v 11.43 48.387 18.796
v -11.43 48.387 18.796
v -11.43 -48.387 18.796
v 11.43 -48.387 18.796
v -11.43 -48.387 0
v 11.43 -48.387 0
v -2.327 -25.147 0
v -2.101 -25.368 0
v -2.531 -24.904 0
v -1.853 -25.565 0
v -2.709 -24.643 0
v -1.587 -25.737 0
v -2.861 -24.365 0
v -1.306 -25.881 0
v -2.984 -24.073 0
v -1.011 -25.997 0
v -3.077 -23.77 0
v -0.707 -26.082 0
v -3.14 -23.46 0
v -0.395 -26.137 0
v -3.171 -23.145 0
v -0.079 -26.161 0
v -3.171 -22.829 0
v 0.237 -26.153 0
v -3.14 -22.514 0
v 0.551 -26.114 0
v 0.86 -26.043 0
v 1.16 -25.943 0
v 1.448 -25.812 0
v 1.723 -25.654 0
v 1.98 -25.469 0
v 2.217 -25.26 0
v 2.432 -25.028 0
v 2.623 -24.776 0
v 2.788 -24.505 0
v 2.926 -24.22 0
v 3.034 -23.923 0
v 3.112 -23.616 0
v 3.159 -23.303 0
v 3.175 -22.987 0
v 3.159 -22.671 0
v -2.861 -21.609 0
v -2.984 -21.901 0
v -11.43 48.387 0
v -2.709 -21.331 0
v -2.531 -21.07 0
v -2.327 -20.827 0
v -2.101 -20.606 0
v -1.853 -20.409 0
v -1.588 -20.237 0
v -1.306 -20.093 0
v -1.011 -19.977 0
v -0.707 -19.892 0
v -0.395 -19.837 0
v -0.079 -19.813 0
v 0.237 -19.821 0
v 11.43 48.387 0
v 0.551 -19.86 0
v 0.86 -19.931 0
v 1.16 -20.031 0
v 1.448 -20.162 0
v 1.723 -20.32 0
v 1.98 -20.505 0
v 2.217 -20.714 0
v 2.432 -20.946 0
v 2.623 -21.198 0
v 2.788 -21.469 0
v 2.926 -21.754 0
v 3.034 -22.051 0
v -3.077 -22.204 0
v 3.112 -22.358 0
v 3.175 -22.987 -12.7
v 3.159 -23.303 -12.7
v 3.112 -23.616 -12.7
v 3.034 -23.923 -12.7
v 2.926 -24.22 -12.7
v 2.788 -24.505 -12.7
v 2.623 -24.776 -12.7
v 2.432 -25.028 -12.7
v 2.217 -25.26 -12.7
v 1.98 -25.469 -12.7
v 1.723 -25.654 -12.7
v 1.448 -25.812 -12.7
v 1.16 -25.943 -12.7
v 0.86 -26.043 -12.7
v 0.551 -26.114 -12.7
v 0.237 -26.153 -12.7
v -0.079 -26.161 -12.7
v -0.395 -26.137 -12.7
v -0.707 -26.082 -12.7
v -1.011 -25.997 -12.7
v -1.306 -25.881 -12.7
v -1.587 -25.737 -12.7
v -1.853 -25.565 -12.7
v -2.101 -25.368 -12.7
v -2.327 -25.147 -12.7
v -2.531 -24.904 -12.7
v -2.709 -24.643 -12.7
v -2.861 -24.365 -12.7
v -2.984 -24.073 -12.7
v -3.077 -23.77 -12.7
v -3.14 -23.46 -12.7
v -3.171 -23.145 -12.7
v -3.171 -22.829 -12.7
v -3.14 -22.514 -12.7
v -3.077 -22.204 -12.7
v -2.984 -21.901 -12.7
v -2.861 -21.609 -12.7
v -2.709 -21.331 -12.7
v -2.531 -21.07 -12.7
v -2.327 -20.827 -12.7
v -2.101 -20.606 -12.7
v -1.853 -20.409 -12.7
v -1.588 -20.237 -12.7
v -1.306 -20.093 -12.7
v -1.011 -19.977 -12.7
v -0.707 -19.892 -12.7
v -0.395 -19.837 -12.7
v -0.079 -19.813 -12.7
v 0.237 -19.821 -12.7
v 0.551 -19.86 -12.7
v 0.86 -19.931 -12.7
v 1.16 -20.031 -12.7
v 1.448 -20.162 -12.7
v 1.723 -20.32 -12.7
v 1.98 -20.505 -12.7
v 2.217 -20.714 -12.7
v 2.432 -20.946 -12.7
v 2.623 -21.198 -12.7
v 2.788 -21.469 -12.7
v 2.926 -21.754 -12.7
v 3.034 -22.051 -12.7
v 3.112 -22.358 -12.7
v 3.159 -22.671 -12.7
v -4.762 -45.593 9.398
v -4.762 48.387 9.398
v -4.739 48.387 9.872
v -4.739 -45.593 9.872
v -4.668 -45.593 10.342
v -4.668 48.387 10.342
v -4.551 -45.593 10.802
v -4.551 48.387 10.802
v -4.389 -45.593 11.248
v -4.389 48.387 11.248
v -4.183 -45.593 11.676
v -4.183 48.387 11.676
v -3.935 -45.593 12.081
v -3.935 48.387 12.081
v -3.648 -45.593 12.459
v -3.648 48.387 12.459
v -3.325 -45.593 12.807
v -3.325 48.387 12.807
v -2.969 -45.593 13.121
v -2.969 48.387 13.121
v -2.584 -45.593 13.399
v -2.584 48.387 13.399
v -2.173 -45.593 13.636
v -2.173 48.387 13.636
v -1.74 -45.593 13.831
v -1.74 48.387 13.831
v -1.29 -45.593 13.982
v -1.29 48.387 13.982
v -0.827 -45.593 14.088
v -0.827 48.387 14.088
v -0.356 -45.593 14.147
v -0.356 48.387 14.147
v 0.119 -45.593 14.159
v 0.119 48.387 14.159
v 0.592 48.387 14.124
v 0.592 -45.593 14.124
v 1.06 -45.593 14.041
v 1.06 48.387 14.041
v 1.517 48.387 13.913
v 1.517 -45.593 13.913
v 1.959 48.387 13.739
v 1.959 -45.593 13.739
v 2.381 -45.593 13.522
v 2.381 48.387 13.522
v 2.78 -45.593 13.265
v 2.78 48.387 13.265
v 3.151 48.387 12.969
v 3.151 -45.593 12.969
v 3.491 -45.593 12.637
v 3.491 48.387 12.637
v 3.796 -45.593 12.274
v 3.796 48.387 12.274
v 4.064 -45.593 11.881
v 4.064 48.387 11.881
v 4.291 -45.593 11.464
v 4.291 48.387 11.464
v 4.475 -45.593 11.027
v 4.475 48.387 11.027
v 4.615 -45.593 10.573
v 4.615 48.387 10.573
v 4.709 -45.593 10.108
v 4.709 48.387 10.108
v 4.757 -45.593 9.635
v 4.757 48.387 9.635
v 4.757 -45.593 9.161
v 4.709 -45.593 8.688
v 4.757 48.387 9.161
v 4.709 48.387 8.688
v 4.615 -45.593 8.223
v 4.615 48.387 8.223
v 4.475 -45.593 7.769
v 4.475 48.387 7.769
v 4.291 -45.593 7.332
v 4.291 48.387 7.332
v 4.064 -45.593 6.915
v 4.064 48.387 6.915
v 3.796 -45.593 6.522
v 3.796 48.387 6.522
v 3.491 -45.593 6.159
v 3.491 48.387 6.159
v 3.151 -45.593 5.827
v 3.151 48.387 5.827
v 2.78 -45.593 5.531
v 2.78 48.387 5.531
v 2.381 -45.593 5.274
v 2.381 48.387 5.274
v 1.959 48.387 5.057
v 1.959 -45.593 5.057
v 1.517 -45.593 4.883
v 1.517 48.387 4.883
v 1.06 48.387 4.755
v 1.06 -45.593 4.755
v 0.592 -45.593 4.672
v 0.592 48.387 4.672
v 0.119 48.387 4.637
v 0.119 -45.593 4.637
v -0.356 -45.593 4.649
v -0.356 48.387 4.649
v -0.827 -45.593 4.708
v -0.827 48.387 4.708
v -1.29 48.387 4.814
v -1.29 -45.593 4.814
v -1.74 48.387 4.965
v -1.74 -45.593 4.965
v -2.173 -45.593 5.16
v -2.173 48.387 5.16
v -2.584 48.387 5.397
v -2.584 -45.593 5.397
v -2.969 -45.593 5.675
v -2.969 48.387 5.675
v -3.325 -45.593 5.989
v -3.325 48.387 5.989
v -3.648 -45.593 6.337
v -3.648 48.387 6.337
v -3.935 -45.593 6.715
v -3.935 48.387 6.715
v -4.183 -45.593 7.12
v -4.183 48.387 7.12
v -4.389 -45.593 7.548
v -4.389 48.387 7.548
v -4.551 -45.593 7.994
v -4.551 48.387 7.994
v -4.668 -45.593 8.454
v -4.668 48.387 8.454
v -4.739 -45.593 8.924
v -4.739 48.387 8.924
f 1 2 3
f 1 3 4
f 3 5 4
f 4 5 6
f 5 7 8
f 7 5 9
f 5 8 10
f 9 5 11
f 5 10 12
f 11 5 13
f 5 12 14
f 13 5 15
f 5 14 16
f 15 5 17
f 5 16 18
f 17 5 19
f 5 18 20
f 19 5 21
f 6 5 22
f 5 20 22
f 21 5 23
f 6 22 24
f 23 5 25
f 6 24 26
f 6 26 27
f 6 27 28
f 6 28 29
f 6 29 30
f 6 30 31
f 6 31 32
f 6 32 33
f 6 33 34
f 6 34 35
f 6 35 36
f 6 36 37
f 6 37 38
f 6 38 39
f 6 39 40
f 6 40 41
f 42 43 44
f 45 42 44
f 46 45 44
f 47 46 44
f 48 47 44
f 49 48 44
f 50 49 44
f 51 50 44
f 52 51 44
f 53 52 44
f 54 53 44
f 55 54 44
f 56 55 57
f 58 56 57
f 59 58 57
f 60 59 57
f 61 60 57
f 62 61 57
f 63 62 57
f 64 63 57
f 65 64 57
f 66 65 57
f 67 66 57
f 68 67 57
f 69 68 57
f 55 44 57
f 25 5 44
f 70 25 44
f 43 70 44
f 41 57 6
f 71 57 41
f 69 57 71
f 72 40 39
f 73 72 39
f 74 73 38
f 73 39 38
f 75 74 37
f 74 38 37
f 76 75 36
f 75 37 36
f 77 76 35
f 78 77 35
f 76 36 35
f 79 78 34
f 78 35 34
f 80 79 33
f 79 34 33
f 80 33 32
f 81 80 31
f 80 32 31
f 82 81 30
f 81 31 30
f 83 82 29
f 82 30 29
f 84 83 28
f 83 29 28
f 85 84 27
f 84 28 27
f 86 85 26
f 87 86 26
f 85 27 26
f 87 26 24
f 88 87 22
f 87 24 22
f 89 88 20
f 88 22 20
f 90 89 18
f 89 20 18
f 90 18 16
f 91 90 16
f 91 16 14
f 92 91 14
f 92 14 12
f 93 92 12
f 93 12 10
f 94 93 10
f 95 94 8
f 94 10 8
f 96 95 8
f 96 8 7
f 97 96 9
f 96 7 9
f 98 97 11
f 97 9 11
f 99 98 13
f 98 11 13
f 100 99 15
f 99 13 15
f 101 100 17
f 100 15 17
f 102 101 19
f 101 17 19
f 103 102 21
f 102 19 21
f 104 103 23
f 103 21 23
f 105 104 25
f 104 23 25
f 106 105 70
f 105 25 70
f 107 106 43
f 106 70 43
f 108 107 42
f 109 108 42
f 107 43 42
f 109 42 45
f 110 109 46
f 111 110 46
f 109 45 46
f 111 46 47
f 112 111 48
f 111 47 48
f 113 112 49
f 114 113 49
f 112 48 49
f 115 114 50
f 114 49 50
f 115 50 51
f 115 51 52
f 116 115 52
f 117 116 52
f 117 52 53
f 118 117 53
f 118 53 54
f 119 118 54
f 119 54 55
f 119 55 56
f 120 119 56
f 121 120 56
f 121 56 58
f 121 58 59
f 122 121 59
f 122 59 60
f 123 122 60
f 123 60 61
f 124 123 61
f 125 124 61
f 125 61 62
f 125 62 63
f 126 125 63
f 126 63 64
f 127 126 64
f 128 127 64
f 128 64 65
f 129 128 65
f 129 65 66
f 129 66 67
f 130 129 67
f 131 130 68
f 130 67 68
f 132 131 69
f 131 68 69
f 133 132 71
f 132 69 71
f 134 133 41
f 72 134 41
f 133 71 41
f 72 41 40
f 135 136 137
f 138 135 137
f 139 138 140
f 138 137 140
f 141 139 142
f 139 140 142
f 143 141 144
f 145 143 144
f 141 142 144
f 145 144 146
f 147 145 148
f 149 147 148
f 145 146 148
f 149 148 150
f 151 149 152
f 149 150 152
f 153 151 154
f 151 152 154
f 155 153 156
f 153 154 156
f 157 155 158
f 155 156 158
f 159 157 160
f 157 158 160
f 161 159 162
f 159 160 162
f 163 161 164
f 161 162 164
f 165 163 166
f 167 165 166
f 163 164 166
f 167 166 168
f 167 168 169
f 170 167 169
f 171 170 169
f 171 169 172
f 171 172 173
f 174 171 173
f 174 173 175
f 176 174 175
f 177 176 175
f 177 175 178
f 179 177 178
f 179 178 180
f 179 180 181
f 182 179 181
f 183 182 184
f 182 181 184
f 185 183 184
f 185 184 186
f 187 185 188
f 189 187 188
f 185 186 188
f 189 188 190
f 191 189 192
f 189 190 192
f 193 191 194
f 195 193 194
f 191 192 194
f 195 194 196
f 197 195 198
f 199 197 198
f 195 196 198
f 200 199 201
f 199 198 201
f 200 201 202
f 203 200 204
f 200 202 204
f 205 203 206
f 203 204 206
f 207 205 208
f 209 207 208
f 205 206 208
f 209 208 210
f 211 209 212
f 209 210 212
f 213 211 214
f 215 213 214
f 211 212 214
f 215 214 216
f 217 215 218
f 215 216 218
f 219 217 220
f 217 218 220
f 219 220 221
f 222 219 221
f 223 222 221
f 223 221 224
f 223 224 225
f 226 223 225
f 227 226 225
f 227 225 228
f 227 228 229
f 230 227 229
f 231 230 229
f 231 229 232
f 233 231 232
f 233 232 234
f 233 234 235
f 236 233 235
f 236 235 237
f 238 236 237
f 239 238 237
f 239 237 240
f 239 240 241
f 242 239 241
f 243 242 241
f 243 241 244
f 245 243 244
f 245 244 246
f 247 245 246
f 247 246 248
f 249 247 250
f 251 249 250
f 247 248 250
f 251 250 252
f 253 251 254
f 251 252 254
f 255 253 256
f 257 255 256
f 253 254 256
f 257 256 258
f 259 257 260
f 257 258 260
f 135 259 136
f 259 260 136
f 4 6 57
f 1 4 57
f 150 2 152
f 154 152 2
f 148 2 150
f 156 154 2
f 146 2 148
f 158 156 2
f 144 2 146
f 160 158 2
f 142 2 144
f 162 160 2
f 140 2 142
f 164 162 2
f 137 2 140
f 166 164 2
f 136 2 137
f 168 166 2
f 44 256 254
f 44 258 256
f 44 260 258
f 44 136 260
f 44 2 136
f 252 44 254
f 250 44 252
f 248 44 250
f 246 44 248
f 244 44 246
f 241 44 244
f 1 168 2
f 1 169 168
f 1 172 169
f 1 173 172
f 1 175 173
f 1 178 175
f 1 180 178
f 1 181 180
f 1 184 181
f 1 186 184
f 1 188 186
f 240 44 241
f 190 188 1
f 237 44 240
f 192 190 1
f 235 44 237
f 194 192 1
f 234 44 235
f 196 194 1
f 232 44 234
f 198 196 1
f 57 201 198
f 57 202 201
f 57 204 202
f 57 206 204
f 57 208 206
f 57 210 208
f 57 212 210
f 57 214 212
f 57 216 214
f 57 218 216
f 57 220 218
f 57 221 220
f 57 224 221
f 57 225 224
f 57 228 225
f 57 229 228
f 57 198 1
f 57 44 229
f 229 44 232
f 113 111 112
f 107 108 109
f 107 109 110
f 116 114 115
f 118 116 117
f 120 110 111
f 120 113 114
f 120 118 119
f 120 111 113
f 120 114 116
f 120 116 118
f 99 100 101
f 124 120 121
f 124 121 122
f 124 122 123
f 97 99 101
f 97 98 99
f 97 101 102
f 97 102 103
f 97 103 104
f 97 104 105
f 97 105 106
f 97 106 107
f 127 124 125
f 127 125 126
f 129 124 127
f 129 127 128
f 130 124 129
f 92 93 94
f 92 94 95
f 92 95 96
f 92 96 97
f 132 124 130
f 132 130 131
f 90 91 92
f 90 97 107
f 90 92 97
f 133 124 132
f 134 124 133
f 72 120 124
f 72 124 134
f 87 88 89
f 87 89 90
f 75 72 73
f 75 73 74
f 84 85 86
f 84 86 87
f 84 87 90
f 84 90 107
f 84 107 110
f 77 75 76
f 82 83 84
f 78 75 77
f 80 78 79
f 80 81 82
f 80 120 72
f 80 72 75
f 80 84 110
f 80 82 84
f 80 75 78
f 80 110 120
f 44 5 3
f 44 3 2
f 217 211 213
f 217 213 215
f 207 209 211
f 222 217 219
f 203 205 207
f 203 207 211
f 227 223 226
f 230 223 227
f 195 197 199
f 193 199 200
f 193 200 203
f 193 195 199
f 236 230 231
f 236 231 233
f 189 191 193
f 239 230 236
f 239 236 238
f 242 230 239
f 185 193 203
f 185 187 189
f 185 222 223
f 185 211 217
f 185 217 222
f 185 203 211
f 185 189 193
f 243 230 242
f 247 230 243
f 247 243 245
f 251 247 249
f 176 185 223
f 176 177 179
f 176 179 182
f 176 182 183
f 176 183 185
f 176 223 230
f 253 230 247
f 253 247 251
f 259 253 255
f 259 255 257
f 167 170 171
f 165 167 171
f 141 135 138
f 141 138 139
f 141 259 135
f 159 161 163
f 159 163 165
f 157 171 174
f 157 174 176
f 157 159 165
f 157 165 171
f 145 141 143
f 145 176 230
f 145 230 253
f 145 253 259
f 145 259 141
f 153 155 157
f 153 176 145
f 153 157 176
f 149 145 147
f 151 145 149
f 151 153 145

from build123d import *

# Parameters (mm, degrees)
F0_W     = 22.86
F0_H     = 96.774
F1_DEPTH = 18.796
F2_R     = 4.7625
F3_DEPTH = 93.98
F4_R     = 3.175
F5_DEPTH = 12.7


with BuildPart() as f1:
    # F0 (on Top) → F1 (new body)
    with BuildSketch(Plane.XY):
        Rectangle(F0_W, F0_H)
    extrude(amount=F1_DEPTH)

    # F2 (on face) → F3 (cut)
    with BuildSketch(Plane(origin=(0, 48.387, 0), x_dir=(-1, 0, 0), z_dir=(0, 1, 0))):
        with Locations((0, 9.398)):
            Circle(F2_R)
    extrude(amount=-F3_DEPTH, mode=Mode.SUBTRACT)

    # F4 (on face) → F5 (join)
    with BuildSketch(Plane(origin=(0, 0, 0), x_dir=(1, 0, 0), z_dir=(0, 0, -1))):
        with Locations((0, 22.987)):
            Circle(F4_R)
    extrude(amount=F5_DEPTH)


solid = f1.part
